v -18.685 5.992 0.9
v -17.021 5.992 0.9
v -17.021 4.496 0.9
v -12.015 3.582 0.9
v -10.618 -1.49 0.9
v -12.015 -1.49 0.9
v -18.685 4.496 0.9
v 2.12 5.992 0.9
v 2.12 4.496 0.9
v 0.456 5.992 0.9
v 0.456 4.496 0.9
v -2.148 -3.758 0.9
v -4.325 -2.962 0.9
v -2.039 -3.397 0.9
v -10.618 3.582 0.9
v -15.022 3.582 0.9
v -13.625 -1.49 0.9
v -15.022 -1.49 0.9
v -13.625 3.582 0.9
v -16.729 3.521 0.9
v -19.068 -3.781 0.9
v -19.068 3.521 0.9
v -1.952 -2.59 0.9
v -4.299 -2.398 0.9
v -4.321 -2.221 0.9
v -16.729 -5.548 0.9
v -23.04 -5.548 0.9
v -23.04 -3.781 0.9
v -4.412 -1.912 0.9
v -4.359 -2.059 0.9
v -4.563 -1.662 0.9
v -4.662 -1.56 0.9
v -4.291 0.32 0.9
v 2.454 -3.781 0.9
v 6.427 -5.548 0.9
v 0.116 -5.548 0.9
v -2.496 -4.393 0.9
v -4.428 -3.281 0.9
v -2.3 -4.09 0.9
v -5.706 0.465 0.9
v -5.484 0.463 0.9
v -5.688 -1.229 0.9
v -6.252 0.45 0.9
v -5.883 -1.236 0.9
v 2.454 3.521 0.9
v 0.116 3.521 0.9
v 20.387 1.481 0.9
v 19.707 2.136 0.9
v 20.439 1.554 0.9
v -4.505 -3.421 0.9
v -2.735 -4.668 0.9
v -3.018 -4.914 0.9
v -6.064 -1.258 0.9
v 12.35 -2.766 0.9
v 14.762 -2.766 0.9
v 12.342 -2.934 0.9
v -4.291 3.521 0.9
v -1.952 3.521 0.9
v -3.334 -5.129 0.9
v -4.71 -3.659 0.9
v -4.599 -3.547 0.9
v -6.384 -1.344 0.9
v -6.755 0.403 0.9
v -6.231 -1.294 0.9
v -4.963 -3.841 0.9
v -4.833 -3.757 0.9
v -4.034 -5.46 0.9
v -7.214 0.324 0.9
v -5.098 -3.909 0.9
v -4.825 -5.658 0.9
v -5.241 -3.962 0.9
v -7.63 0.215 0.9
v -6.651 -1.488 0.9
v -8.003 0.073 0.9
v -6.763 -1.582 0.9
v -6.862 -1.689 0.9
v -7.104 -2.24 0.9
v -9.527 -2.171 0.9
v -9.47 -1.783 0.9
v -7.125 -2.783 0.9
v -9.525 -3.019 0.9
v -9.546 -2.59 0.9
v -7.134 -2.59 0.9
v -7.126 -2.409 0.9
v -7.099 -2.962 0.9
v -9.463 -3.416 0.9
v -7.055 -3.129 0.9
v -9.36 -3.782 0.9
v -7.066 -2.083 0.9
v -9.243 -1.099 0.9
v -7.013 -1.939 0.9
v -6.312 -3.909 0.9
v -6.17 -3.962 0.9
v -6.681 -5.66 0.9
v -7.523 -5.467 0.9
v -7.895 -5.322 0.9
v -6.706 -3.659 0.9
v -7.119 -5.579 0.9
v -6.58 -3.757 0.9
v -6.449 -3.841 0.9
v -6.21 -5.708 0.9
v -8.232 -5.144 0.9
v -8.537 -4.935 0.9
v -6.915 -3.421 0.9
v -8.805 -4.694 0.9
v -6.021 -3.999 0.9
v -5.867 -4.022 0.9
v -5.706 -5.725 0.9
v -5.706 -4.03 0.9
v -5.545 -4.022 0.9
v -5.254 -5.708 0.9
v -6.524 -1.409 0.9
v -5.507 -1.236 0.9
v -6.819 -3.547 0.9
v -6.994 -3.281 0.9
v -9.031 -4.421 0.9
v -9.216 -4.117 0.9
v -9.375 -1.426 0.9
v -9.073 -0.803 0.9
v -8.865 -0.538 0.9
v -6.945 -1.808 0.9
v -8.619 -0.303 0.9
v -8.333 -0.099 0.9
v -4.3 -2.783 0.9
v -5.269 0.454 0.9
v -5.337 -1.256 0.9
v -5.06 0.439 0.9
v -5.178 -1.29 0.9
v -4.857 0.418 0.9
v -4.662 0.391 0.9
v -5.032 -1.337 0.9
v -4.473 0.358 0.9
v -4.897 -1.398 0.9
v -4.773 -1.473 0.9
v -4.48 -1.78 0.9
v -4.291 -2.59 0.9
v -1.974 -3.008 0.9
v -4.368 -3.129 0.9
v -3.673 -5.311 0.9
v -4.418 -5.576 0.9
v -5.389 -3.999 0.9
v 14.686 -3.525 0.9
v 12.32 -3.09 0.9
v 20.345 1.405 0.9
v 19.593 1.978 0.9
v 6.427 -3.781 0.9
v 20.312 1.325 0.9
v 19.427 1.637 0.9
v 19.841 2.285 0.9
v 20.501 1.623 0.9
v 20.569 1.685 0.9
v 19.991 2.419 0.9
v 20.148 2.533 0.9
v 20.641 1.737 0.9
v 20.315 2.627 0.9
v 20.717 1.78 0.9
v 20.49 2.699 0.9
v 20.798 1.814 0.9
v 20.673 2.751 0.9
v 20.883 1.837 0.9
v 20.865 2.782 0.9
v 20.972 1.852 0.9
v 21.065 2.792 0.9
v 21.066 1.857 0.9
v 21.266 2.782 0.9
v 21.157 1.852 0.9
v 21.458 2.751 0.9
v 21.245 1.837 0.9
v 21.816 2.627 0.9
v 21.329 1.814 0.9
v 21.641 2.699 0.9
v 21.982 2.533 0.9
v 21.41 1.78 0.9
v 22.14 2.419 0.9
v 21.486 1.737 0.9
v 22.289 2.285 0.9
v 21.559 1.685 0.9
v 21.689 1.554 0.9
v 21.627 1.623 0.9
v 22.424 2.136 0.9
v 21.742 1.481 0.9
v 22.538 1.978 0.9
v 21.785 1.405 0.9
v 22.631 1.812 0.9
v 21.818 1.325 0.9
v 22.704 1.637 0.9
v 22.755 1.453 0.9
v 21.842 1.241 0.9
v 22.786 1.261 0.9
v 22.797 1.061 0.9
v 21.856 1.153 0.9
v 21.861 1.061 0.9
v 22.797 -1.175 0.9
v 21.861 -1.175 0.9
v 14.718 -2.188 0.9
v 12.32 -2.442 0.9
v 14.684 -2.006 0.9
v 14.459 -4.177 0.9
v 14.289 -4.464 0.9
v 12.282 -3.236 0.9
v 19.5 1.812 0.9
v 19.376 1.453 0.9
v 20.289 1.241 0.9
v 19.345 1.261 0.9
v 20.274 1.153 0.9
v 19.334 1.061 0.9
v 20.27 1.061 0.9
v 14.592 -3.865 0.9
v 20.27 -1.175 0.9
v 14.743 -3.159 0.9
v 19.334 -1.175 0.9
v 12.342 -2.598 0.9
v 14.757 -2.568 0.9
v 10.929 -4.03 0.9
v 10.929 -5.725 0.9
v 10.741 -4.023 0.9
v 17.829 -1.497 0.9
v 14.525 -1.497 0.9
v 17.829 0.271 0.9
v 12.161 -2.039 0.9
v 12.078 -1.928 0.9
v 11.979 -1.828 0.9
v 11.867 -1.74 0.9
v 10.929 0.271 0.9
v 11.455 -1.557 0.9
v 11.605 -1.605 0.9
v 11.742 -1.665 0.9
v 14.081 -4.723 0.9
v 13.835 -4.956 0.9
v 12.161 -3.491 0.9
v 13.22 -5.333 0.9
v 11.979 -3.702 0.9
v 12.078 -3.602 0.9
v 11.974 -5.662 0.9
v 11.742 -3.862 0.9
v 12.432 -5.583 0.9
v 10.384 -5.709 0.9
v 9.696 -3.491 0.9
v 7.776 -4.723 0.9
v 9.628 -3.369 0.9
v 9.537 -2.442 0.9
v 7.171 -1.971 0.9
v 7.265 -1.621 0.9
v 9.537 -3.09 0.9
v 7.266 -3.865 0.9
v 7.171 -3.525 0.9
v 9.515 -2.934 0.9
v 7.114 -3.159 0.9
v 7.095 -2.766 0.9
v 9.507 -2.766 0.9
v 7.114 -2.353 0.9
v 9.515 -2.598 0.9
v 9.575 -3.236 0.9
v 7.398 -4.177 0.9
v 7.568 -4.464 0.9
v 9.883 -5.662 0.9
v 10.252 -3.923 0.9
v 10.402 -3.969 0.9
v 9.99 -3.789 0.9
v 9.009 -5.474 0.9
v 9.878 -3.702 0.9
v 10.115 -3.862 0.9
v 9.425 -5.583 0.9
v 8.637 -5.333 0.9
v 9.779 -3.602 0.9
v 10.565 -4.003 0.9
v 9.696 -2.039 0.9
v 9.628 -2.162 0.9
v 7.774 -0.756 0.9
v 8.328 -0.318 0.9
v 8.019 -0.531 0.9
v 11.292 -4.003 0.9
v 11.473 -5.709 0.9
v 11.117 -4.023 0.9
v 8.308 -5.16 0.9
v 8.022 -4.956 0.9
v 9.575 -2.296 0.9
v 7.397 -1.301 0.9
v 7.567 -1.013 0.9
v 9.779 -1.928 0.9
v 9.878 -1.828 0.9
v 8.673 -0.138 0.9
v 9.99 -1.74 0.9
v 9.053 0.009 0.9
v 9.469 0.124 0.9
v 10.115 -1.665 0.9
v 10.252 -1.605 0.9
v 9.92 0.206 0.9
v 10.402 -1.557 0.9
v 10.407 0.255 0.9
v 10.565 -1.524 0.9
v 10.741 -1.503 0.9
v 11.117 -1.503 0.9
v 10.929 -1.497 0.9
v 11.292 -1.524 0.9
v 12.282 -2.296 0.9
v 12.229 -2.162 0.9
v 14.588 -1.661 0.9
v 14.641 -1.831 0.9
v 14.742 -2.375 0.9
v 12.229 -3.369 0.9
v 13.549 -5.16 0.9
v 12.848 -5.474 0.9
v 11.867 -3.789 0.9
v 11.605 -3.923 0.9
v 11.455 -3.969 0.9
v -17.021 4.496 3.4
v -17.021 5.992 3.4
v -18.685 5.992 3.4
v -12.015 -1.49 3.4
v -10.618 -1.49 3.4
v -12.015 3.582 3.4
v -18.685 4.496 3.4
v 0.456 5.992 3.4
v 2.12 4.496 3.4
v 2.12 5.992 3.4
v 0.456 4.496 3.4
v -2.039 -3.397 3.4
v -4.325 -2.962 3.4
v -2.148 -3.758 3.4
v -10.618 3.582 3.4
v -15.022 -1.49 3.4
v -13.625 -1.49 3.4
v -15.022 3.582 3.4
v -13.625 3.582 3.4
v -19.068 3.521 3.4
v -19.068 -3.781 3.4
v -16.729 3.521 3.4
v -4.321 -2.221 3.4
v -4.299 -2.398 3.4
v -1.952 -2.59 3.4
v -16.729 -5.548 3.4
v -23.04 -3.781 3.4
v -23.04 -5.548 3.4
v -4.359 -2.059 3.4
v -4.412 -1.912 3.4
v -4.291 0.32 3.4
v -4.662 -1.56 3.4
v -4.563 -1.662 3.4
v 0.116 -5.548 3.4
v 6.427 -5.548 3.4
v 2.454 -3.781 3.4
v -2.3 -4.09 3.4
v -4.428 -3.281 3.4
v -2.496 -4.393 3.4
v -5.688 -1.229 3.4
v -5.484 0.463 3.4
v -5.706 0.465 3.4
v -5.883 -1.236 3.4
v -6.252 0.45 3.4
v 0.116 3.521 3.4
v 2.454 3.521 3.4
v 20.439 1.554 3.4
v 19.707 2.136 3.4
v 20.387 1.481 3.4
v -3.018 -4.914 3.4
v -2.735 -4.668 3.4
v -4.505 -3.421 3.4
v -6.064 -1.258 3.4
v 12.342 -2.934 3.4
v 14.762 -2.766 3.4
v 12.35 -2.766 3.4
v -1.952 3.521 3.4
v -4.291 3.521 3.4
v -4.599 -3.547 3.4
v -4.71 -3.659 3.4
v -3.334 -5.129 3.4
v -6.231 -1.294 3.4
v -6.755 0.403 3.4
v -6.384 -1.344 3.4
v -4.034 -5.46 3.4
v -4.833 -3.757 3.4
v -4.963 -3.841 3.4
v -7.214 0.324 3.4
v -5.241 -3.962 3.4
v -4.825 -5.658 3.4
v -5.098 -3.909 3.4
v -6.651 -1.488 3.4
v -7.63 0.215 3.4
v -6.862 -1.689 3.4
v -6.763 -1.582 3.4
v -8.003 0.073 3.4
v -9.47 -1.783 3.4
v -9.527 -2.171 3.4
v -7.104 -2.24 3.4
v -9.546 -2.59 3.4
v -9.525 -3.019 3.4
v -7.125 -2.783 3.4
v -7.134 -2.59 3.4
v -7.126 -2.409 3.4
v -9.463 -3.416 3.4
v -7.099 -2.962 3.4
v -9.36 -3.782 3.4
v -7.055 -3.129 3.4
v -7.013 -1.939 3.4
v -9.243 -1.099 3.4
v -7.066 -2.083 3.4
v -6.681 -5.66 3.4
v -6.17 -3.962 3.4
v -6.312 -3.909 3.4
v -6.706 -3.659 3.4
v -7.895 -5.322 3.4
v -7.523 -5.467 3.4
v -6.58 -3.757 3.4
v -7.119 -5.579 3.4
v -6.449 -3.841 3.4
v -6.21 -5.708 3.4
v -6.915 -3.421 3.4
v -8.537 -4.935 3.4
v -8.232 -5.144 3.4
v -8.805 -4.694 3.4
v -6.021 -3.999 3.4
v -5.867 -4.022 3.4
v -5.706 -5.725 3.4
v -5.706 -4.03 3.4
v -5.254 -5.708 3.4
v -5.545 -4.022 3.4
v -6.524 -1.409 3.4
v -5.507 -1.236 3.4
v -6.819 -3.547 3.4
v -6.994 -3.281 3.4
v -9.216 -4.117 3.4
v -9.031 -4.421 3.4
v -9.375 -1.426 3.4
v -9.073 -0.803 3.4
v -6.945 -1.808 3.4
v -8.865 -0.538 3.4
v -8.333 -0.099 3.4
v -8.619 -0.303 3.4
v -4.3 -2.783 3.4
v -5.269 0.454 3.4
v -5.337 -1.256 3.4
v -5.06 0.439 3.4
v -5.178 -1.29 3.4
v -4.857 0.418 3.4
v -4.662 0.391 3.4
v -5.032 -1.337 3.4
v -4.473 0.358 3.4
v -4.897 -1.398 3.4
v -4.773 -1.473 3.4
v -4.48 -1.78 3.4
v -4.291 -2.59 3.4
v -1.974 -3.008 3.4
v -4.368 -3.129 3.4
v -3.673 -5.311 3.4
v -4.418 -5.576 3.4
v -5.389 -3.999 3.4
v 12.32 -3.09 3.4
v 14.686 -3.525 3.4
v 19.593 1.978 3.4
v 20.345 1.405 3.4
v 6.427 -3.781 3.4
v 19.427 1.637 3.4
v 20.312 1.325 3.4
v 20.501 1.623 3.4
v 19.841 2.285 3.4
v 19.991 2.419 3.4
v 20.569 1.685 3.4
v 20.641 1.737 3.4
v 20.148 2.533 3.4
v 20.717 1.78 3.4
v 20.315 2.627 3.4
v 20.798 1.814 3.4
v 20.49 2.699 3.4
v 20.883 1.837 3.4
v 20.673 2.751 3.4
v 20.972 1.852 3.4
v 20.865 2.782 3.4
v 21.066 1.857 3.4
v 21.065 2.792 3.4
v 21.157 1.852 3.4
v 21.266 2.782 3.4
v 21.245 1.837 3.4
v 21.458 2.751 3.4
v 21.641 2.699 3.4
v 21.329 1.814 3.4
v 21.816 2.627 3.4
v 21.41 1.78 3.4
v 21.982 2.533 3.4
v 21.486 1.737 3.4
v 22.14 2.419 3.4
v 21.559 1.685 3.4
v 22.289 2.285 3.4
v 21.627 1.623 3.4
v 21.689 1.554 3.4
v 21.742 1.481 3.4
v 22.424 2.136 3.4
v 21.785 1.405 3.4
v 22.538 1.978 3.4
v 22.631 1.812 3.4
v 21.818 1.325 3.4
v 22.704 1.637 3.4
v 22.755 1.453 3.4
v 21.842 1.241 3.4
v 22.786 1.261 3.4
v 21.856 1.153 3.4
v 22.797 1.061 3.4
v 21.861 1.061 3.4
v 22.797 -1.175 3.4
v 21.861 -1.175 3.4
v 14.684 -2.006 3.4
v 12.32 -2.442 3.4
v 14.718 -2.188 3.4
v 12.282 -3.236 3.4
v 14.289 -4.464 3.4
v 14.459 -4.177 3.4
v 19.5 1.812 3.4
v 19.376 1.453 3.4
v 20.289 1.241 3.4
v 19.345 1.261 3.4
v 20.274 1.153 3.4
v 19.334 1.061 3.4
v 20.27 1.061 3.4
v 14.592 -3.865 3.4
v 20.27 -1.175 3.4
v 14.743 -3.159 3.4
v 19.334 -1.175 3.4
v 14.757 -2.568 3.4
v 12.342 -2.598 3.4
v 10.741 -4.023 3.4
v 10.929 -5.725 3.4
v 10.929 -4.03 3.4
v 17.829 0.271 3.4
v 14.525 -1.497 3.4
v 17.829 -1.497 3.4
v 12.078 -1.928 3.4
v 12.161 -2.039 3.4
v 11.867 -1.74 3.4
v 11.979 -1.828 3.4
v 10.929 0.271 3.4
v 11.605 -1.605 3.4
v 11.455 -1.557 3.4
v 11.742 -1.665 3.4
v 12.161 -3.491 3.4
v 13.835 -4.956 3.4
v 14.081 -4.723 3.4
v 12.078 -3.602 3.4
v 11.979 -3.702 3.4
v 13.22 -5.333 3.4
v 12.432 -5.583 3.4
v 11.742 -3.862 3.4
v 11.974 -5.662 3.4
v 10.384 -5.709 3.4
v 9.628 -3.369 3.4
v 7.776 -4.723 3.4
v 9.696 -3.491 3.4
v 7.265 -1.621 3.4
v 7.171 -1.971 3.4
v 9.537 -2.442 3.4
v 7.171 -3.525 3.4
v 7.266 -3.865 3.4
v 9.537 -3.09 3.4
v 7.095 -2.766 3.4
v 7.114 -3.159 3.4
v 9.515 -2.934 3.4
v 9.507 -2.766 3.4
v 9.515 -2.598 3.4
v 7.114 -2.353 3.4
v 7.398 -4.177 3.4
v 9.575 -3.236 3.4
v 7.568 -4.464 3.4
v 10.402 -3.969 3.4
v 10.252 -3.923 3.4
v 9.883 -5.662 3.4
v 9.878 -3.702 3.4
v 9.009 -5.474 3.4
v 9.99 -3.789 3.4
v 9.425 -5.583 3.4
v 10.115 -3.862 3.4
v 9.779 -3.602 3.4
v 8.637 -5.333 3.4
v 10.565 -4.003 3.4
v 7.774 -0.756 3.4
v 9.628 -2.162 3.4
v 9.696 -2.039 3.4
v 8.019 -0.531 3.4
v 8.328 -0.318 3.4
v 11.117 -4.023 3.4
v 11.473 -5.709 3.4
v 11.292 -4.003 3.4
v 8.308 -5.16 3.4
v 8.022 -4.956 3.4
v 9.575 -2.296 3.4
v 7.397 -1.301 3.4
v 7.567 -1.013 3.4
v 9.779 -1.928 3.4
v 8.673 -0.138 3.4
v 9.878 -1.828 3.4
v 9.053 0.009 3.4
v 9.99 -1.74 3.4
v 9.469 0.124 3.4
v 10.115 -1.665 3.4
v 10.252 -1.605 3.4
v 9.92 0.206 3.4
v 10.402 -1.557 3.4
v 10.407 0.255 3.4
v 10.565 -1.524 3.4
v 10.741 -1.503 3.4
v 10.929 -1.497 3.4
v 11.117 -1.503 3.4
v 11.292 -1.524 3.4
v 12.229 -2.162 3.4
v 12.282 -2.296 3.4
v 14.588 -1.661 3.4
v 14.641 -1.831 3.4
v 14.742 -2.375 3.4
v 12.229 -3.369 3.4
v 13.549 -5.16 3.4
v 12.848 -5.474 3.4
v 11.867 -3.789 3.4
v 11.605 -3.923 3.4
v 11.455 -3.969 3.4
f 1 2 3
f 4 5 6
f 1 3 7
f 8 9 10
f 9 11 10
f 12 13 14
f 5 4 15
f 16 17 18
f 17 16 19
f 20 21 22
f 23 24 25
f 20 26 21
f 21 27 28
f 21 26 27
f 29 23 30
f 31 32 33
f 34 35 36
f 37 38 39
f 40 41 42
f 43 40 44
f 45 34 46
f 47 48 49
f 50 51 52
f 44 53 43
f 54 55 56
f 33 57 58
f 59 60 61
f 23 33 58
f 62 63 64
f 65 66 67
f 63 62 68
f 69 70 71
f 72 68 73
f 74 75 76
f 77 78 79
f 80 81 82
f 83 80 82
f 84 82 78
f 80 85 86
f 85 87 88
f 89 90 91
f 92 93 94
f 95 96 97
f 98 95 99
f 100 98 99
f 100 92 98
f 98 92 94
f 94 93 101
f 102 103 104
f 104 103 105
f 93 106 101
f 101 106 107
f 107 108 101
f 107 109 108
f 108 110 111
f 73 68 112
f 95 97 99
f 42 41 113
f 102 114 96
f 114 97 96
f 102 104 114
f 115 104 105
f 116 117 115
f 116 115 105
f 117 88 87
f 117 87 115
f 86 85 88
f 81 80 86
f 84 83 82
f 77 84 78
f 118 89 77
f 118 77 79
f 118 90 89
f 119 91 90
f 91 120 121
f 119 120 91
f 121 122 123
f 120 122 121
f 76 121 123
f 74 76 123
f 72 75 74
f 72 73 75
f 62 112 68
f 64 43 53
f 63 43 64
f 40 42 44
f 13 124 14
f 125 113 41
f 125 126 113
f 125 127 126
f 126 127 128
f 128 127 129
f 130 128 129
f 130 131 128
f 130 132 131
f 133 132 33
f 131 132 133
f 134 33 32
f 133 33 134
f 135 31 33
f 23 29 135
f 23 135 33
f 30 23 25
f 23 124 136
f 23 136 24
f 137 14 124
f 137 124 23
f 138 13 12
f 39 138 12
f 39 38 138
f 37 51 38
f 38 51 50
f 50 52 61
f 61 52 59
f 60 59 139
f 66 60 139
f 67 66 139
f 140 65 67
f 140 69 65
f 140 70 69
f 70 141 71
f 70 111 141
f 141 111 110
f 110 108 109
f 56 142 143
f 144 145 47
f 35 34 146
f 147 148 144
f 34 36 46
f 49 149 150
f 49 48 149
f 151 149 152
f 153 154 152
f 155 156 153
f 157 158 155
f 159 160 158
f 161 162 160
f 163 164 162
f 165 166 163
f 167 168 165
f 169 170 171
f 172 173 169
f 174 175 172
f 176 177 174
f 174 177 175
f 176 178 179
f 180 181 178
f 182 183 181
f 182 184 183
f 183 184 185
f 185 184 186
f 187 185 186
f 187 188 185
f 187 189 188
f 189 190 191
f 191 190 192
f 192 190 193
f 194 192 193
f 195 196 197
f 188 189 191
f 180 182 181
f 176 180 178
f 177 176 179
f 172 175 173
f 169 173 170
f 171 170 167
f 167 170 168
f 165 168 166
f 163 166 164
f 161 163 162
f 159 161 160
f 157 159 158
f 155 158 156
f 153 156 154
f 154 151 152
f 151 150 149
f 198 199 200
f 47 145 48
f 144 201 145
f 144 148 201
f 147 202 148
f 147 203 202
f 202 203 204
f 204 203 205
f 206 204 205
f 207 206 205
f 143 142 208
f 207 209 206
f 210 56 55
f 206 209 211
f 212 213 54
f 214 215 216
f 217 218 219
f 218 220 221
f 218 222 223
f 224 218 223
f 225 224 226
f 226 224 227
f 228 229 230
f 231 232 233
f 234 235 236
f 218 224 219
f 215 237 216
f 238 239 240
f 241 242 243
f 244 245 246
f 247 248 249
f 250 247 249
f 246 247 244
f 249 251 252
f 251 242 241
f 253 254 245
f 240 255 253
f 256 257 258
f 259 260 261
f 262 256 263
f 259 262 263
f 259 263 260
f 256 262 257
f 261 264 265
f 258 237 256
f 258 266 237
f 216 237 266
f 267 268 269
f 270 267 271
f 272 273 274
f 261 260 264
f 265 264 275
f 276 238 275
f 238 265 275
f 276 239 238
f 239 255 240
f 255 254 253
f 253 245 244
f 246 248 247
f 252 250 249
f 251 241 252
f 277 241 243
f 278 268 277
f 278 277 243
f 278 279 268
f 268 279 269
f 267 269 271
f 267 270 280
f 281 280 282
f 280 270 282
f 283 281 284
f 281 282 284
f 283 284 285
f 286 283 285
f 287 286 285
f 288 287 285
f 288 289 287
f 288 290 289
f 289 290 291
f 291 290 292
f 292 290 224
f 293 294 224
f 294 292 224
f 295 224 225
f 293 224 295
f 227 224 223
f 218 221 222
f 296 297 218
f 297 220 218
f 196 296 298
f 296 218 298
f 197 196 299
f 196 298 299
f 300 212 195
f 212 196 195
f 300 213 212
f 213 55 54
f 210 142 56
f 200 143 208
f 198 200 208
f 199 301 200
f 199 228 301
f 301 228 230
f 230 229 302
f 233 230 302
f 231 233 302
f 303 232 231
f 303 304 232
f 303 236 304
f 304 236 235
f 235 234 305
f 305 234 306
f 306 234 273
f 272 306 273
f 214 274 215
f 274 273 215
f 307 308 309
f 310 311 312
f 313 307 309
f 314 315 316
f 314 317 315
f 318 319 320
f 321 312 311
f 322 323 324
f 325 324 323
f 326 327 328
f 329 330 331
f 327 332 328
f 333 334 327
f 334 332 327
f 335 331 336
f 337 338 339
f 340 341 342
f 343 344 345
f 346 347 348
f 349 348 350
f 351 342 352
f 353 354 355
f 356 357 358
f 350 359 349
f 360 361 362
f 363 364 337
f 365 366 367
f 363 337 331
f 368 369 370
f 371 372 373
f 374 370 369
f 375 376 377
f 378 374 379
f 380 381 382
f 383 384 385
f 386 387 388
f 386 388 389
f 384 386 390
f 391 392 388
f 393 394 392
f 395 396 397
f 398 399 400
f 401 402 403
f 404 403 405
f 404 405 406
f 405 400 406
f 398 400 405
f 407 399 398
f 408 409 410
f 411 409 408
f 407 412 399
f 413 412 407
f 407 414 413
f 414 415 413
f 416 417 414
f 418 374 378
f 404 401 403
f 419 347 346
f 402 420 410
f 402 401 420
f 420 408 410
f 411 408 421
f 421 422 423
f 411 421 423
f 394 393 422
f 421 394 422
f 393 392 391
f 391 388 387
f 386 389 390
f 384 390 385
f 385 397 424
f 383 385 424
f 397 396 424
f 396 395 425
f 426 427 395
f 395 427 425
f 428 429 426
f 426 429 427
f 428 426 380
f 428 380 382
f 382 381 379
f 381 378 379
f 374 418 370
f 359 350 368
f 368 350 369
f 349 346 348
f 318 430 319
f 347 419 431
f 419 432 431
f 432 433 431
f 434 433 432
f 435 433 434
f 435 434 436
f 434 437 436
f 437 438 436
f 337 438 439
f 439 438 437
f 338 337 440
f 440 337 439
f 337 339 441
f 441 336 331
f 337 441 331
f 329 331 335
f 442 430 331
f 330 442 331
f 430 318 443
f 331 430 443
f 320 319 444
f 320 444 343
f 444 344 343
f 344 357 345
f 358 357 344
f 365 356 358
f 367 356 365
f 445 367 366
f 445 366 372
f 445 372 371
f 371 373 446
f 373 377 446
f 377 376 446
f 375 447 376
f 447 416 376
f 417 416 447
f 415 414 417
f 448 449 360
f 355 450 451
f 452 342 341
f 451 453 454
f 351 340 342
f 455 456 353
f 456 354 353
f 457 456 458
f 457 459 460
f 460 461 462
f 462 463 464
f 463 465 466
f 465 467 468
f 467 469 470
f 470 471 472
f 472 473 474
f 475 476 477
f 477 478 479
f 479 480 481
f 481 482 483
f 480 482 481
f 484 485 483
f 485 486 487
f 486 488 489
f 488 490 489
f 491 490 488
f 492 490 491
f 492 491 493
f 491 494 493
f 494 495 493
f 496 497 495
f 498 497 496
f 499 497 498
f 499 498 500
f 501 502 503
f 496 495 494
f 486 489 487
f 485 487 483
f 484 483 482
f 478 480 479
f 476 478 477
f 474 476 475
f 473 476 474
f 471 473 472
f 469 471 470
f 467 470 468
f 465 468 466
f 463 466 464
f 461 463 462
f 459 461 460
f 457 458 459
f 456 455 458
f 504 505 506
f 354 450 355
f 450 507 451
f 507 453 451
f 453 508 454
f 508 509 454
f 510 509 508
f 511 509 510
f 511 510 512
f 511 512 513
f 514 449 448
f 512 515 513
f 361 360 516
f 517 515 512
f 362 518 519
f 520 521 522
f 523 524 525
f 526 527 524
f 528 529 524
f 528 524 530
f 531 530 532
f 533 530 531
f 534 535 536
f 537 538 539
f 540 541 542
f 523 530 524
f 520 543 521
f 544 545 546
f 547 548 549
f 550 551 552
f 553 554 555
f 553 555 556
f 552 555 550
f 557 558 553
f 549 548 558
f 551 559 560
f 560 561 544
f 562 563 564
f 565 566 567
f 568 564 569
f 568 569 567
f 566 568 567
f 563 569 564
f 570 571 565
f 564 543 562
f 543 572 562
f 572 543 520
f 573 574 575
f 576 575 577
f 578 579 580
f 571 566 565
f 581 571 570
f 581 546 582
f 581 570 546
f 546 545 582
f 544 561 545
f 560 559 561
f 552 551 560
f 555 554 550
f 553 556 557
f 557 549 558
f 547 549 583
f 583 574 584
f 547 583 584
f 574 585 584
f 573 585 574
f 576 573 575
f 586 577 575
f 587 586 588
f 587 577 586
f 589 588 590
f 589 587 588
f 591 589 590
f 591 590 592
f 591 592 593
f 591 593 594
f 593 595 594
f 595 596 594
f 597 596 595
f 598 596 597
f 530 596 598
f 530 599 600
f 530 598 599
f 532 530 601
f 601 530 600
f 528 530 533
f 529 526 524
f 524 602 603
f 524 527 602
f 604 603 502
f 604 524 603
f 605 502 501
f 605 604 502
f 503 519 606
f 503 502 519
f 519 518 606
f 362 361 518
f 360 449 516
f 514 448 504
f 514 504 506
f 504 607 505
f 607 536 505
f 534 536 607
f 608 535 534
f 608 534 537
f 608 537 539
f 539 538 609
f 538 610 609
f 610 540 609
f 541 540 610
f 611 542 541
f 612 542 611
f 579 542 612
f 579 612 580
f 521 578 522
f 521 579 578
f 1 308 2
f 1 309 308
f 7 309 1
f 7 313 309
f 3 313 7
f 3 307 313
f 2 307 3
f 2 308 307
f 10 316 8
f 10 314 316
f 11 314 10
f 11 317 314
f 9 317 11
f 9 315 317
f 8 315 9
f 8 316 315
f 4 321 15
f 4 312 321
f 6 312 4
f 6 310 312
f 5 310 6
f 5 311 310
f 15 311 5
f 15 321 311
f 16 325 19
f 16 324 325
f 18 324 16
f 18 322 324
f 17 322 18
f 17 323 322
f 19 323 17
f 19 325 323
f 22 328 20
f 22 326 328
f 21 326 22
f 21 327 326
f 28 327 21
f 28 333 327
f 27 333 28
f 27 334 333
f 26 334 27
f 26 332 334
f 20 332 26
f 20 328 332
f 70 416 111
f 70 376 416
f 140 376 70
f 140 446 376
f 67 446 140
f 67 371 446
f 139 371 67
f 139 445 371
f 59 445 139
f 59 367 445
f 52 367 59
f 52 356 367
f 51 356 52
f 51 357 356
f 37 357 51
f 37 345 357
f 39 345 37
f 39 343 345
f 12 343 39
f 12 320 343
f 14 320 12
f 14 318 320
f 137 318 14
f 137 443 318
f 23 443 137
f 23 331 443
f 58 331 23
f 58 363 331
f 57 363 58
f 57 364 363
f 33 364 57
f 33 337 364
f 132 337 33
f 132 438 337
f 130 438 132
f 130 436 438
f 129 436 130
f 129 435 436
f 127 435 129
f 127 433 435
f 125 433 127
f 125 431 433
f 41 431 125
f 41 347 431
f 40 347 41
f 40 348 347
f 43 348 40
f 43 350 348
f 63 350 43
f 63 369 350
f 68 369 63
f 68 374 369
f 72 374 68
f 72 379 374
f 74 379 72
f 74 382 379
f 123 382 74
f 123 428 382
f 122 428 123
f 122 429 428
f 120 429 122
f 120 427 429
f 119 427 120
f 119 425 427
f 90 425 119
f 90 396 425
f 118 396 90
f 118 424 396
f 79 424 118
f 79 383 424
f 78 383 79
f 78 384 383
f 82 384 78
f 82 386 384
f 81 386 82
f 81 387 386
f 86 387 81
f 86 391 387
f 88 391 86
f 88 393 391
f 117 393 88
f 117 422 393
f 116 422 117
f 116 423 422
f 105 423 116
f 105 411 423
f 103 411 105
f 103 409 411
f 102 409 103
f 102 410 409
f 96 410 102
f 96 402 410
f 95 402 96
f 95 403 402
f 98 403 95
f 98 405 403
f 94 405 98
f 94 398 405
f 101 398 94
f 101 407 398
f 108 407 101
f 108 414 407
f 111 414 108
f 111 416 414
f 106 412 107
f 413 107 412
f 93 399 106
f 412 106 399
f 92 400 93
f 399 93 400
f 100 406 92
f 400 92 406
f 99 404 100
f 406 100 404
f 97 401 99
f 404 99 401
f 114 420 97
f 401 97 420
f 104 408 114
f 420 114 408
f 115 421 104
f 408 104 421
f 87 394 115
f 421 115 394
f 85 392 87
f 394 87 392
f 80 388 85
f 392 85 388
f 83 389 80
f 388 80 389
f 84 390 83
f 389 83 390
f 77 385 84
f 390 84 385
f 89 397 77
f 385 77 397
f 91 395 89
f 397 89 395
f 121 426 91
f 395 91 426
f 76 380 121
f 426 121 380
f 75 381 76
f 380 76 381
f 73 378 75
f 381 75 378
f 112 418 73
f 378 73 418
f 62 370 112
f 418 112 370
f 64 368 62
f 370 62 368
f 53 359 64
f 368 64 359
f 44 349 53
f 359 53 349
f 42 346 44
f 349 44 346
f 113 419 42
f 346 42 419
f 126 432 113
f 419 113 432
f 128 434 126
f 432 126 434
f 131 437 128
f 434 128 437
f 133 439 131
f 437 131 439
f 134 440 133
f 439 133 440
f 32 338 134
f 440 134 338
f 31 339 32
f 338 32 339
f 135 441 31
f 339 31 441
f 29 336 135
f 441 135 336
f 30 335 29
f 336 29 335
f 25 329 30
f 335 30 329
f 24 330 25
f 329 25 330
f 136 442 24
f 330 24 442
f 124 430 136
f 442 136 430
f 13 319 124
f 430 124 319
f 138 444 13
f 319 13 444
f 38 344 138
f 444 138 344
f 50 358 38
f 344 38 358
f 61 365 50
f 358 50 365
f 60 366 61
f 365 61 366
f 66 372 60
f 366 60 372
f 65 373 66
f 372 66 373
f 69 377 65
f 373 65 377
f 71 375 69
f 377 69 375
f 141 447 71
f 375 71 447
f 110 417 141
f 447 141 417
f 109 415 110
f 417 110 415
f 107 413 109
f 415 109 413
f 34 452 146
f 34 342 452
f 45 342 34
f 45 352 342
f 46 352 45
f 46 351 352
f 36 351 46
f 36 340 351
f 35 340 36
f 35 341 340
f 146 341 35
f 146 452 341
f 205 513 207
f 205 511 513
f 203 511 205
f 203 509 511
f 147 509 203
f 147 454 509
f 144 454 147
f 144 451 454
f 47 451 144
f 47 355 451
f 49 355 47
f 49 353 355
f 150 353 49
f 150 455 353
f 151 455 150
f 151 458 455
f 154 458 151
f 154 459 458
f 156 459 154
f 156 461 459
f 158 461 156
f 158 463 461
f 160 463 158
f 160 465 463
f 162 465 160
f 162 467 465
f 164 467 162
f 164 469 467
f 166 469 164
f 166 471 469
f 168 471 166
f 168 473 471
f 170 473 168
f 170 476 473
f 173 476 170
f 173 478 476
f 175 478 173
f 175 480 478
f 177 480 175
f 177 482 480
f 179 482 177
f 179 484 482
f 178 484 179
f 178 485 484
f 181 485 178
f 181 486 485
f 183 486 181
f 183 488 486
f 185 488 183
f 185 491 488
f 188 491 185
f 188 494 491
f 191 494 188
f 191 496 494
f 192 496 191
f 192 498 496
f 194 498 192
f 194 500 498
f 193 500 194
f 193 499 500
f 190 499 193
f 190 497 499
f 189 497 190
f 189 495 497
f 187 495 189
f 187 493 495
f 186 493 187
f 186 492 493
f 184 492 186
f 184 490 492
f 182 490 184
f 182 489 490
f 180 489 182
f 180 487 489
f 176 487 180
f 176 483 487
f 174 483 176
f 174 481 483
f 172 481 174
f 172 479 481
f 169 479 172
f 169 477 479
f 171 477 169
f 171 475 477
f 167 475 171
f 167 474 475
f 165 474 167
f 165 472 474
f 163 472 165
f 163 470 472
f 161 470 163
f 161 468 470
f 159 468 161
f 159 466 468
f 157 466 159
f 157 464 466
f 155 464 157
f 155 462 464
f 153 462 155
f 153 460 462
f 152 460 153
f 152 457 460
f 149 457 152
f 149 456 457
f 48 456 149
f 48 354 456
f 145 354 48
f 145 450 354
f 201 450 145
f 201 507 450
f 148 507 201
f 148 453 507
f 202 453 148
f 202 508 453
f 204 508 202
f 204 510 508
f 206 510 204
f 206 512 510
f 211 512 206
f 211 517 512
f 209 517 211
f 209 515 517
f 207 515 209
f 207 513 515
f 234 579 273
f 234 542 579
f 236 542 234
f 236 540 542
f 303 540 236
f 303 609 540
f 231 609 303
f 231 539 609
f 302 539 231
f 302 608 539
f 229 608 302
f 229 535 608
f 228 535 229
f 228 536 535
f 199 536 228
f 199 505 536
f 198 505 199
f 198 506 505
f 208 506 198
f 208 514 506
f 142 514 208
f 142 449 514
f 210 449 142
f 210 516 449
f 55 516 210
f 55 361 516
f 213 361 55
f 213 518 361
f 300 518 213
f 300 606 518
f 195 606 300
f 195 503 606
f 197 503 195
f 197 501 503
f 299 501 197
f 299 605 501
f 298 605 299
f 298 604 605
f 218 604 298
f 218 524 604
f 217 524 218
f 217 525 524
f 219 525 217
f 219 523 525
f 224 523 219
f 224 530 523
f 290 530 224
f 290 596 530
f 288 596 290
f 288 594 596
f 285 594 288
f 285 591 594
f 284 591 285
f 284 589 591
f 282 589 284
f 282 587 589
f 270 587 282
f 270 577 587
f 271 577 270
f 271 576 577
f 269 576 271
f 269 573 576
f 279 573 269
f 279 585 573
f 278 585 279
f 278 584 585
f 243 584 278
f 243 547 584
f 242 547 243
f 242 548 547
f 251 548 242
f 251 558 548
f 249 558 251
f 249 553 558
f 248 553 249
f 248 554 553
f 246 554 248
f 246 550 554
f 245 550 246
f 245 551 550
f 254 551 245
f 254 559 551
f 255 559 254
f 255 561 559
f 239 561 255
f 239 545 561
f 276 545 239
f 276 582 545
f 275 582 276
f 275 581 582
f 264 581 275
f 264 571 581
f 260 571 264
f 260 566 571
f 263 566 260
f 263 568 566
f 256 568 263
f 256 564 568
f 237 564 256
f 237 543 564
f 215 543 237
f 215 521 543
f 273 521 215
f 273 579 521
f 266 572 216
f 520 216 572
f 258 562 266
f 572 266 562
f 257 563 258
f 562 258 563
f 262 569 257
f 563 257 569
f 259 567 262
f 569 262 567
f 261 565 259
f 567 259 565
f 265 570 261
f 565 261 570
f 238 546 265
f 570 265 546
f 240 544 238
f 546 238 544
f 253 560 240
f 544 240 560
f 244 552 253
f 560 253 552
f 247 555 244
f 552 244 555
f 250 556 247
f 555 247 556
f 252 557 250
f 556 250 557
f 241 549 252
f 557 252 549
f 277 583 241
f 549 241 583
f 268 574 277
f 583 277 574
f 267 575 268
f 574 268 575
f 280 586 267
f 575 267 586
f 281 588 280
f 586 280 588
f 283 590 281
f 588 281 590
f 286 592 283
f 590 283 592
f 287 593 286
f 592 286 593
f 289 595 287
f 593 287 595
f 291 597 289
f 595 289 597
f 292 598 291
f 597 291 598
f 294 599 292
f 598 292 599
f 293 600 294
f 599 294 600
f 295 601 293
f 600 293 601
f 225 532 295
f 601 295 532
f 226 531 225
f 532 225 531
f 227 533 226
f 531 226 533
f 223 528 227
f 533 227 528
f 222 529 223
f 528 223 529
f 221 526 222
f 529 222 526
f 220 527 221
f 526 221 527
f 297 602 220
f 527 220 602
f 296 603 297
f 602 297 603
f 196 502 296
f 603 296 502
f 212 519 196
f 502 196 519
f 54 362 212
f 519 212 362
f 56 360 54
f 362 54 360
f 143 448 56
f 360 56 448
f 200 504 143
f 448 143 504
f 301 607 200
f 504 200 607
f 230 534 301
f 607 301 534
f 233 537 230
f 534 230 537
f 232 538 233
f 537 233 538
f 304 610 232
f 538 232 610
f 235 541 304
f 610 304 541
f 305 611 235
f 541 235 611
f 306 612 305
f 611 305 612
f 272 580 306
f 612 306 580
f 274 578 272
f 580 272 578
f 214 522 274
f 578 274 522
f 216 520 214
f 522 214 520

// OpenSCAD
$fn = 48;
  // syllabics (overlaid on icon, tallest)
  translate([0, 0.000, 0.900]) linear_extrude(height=2.500) text("ᒨᐦᑯᒫᓂᐢ", size=8.958, halign="center", valign="center", font="Euphemia UCAS:style=Bold");
